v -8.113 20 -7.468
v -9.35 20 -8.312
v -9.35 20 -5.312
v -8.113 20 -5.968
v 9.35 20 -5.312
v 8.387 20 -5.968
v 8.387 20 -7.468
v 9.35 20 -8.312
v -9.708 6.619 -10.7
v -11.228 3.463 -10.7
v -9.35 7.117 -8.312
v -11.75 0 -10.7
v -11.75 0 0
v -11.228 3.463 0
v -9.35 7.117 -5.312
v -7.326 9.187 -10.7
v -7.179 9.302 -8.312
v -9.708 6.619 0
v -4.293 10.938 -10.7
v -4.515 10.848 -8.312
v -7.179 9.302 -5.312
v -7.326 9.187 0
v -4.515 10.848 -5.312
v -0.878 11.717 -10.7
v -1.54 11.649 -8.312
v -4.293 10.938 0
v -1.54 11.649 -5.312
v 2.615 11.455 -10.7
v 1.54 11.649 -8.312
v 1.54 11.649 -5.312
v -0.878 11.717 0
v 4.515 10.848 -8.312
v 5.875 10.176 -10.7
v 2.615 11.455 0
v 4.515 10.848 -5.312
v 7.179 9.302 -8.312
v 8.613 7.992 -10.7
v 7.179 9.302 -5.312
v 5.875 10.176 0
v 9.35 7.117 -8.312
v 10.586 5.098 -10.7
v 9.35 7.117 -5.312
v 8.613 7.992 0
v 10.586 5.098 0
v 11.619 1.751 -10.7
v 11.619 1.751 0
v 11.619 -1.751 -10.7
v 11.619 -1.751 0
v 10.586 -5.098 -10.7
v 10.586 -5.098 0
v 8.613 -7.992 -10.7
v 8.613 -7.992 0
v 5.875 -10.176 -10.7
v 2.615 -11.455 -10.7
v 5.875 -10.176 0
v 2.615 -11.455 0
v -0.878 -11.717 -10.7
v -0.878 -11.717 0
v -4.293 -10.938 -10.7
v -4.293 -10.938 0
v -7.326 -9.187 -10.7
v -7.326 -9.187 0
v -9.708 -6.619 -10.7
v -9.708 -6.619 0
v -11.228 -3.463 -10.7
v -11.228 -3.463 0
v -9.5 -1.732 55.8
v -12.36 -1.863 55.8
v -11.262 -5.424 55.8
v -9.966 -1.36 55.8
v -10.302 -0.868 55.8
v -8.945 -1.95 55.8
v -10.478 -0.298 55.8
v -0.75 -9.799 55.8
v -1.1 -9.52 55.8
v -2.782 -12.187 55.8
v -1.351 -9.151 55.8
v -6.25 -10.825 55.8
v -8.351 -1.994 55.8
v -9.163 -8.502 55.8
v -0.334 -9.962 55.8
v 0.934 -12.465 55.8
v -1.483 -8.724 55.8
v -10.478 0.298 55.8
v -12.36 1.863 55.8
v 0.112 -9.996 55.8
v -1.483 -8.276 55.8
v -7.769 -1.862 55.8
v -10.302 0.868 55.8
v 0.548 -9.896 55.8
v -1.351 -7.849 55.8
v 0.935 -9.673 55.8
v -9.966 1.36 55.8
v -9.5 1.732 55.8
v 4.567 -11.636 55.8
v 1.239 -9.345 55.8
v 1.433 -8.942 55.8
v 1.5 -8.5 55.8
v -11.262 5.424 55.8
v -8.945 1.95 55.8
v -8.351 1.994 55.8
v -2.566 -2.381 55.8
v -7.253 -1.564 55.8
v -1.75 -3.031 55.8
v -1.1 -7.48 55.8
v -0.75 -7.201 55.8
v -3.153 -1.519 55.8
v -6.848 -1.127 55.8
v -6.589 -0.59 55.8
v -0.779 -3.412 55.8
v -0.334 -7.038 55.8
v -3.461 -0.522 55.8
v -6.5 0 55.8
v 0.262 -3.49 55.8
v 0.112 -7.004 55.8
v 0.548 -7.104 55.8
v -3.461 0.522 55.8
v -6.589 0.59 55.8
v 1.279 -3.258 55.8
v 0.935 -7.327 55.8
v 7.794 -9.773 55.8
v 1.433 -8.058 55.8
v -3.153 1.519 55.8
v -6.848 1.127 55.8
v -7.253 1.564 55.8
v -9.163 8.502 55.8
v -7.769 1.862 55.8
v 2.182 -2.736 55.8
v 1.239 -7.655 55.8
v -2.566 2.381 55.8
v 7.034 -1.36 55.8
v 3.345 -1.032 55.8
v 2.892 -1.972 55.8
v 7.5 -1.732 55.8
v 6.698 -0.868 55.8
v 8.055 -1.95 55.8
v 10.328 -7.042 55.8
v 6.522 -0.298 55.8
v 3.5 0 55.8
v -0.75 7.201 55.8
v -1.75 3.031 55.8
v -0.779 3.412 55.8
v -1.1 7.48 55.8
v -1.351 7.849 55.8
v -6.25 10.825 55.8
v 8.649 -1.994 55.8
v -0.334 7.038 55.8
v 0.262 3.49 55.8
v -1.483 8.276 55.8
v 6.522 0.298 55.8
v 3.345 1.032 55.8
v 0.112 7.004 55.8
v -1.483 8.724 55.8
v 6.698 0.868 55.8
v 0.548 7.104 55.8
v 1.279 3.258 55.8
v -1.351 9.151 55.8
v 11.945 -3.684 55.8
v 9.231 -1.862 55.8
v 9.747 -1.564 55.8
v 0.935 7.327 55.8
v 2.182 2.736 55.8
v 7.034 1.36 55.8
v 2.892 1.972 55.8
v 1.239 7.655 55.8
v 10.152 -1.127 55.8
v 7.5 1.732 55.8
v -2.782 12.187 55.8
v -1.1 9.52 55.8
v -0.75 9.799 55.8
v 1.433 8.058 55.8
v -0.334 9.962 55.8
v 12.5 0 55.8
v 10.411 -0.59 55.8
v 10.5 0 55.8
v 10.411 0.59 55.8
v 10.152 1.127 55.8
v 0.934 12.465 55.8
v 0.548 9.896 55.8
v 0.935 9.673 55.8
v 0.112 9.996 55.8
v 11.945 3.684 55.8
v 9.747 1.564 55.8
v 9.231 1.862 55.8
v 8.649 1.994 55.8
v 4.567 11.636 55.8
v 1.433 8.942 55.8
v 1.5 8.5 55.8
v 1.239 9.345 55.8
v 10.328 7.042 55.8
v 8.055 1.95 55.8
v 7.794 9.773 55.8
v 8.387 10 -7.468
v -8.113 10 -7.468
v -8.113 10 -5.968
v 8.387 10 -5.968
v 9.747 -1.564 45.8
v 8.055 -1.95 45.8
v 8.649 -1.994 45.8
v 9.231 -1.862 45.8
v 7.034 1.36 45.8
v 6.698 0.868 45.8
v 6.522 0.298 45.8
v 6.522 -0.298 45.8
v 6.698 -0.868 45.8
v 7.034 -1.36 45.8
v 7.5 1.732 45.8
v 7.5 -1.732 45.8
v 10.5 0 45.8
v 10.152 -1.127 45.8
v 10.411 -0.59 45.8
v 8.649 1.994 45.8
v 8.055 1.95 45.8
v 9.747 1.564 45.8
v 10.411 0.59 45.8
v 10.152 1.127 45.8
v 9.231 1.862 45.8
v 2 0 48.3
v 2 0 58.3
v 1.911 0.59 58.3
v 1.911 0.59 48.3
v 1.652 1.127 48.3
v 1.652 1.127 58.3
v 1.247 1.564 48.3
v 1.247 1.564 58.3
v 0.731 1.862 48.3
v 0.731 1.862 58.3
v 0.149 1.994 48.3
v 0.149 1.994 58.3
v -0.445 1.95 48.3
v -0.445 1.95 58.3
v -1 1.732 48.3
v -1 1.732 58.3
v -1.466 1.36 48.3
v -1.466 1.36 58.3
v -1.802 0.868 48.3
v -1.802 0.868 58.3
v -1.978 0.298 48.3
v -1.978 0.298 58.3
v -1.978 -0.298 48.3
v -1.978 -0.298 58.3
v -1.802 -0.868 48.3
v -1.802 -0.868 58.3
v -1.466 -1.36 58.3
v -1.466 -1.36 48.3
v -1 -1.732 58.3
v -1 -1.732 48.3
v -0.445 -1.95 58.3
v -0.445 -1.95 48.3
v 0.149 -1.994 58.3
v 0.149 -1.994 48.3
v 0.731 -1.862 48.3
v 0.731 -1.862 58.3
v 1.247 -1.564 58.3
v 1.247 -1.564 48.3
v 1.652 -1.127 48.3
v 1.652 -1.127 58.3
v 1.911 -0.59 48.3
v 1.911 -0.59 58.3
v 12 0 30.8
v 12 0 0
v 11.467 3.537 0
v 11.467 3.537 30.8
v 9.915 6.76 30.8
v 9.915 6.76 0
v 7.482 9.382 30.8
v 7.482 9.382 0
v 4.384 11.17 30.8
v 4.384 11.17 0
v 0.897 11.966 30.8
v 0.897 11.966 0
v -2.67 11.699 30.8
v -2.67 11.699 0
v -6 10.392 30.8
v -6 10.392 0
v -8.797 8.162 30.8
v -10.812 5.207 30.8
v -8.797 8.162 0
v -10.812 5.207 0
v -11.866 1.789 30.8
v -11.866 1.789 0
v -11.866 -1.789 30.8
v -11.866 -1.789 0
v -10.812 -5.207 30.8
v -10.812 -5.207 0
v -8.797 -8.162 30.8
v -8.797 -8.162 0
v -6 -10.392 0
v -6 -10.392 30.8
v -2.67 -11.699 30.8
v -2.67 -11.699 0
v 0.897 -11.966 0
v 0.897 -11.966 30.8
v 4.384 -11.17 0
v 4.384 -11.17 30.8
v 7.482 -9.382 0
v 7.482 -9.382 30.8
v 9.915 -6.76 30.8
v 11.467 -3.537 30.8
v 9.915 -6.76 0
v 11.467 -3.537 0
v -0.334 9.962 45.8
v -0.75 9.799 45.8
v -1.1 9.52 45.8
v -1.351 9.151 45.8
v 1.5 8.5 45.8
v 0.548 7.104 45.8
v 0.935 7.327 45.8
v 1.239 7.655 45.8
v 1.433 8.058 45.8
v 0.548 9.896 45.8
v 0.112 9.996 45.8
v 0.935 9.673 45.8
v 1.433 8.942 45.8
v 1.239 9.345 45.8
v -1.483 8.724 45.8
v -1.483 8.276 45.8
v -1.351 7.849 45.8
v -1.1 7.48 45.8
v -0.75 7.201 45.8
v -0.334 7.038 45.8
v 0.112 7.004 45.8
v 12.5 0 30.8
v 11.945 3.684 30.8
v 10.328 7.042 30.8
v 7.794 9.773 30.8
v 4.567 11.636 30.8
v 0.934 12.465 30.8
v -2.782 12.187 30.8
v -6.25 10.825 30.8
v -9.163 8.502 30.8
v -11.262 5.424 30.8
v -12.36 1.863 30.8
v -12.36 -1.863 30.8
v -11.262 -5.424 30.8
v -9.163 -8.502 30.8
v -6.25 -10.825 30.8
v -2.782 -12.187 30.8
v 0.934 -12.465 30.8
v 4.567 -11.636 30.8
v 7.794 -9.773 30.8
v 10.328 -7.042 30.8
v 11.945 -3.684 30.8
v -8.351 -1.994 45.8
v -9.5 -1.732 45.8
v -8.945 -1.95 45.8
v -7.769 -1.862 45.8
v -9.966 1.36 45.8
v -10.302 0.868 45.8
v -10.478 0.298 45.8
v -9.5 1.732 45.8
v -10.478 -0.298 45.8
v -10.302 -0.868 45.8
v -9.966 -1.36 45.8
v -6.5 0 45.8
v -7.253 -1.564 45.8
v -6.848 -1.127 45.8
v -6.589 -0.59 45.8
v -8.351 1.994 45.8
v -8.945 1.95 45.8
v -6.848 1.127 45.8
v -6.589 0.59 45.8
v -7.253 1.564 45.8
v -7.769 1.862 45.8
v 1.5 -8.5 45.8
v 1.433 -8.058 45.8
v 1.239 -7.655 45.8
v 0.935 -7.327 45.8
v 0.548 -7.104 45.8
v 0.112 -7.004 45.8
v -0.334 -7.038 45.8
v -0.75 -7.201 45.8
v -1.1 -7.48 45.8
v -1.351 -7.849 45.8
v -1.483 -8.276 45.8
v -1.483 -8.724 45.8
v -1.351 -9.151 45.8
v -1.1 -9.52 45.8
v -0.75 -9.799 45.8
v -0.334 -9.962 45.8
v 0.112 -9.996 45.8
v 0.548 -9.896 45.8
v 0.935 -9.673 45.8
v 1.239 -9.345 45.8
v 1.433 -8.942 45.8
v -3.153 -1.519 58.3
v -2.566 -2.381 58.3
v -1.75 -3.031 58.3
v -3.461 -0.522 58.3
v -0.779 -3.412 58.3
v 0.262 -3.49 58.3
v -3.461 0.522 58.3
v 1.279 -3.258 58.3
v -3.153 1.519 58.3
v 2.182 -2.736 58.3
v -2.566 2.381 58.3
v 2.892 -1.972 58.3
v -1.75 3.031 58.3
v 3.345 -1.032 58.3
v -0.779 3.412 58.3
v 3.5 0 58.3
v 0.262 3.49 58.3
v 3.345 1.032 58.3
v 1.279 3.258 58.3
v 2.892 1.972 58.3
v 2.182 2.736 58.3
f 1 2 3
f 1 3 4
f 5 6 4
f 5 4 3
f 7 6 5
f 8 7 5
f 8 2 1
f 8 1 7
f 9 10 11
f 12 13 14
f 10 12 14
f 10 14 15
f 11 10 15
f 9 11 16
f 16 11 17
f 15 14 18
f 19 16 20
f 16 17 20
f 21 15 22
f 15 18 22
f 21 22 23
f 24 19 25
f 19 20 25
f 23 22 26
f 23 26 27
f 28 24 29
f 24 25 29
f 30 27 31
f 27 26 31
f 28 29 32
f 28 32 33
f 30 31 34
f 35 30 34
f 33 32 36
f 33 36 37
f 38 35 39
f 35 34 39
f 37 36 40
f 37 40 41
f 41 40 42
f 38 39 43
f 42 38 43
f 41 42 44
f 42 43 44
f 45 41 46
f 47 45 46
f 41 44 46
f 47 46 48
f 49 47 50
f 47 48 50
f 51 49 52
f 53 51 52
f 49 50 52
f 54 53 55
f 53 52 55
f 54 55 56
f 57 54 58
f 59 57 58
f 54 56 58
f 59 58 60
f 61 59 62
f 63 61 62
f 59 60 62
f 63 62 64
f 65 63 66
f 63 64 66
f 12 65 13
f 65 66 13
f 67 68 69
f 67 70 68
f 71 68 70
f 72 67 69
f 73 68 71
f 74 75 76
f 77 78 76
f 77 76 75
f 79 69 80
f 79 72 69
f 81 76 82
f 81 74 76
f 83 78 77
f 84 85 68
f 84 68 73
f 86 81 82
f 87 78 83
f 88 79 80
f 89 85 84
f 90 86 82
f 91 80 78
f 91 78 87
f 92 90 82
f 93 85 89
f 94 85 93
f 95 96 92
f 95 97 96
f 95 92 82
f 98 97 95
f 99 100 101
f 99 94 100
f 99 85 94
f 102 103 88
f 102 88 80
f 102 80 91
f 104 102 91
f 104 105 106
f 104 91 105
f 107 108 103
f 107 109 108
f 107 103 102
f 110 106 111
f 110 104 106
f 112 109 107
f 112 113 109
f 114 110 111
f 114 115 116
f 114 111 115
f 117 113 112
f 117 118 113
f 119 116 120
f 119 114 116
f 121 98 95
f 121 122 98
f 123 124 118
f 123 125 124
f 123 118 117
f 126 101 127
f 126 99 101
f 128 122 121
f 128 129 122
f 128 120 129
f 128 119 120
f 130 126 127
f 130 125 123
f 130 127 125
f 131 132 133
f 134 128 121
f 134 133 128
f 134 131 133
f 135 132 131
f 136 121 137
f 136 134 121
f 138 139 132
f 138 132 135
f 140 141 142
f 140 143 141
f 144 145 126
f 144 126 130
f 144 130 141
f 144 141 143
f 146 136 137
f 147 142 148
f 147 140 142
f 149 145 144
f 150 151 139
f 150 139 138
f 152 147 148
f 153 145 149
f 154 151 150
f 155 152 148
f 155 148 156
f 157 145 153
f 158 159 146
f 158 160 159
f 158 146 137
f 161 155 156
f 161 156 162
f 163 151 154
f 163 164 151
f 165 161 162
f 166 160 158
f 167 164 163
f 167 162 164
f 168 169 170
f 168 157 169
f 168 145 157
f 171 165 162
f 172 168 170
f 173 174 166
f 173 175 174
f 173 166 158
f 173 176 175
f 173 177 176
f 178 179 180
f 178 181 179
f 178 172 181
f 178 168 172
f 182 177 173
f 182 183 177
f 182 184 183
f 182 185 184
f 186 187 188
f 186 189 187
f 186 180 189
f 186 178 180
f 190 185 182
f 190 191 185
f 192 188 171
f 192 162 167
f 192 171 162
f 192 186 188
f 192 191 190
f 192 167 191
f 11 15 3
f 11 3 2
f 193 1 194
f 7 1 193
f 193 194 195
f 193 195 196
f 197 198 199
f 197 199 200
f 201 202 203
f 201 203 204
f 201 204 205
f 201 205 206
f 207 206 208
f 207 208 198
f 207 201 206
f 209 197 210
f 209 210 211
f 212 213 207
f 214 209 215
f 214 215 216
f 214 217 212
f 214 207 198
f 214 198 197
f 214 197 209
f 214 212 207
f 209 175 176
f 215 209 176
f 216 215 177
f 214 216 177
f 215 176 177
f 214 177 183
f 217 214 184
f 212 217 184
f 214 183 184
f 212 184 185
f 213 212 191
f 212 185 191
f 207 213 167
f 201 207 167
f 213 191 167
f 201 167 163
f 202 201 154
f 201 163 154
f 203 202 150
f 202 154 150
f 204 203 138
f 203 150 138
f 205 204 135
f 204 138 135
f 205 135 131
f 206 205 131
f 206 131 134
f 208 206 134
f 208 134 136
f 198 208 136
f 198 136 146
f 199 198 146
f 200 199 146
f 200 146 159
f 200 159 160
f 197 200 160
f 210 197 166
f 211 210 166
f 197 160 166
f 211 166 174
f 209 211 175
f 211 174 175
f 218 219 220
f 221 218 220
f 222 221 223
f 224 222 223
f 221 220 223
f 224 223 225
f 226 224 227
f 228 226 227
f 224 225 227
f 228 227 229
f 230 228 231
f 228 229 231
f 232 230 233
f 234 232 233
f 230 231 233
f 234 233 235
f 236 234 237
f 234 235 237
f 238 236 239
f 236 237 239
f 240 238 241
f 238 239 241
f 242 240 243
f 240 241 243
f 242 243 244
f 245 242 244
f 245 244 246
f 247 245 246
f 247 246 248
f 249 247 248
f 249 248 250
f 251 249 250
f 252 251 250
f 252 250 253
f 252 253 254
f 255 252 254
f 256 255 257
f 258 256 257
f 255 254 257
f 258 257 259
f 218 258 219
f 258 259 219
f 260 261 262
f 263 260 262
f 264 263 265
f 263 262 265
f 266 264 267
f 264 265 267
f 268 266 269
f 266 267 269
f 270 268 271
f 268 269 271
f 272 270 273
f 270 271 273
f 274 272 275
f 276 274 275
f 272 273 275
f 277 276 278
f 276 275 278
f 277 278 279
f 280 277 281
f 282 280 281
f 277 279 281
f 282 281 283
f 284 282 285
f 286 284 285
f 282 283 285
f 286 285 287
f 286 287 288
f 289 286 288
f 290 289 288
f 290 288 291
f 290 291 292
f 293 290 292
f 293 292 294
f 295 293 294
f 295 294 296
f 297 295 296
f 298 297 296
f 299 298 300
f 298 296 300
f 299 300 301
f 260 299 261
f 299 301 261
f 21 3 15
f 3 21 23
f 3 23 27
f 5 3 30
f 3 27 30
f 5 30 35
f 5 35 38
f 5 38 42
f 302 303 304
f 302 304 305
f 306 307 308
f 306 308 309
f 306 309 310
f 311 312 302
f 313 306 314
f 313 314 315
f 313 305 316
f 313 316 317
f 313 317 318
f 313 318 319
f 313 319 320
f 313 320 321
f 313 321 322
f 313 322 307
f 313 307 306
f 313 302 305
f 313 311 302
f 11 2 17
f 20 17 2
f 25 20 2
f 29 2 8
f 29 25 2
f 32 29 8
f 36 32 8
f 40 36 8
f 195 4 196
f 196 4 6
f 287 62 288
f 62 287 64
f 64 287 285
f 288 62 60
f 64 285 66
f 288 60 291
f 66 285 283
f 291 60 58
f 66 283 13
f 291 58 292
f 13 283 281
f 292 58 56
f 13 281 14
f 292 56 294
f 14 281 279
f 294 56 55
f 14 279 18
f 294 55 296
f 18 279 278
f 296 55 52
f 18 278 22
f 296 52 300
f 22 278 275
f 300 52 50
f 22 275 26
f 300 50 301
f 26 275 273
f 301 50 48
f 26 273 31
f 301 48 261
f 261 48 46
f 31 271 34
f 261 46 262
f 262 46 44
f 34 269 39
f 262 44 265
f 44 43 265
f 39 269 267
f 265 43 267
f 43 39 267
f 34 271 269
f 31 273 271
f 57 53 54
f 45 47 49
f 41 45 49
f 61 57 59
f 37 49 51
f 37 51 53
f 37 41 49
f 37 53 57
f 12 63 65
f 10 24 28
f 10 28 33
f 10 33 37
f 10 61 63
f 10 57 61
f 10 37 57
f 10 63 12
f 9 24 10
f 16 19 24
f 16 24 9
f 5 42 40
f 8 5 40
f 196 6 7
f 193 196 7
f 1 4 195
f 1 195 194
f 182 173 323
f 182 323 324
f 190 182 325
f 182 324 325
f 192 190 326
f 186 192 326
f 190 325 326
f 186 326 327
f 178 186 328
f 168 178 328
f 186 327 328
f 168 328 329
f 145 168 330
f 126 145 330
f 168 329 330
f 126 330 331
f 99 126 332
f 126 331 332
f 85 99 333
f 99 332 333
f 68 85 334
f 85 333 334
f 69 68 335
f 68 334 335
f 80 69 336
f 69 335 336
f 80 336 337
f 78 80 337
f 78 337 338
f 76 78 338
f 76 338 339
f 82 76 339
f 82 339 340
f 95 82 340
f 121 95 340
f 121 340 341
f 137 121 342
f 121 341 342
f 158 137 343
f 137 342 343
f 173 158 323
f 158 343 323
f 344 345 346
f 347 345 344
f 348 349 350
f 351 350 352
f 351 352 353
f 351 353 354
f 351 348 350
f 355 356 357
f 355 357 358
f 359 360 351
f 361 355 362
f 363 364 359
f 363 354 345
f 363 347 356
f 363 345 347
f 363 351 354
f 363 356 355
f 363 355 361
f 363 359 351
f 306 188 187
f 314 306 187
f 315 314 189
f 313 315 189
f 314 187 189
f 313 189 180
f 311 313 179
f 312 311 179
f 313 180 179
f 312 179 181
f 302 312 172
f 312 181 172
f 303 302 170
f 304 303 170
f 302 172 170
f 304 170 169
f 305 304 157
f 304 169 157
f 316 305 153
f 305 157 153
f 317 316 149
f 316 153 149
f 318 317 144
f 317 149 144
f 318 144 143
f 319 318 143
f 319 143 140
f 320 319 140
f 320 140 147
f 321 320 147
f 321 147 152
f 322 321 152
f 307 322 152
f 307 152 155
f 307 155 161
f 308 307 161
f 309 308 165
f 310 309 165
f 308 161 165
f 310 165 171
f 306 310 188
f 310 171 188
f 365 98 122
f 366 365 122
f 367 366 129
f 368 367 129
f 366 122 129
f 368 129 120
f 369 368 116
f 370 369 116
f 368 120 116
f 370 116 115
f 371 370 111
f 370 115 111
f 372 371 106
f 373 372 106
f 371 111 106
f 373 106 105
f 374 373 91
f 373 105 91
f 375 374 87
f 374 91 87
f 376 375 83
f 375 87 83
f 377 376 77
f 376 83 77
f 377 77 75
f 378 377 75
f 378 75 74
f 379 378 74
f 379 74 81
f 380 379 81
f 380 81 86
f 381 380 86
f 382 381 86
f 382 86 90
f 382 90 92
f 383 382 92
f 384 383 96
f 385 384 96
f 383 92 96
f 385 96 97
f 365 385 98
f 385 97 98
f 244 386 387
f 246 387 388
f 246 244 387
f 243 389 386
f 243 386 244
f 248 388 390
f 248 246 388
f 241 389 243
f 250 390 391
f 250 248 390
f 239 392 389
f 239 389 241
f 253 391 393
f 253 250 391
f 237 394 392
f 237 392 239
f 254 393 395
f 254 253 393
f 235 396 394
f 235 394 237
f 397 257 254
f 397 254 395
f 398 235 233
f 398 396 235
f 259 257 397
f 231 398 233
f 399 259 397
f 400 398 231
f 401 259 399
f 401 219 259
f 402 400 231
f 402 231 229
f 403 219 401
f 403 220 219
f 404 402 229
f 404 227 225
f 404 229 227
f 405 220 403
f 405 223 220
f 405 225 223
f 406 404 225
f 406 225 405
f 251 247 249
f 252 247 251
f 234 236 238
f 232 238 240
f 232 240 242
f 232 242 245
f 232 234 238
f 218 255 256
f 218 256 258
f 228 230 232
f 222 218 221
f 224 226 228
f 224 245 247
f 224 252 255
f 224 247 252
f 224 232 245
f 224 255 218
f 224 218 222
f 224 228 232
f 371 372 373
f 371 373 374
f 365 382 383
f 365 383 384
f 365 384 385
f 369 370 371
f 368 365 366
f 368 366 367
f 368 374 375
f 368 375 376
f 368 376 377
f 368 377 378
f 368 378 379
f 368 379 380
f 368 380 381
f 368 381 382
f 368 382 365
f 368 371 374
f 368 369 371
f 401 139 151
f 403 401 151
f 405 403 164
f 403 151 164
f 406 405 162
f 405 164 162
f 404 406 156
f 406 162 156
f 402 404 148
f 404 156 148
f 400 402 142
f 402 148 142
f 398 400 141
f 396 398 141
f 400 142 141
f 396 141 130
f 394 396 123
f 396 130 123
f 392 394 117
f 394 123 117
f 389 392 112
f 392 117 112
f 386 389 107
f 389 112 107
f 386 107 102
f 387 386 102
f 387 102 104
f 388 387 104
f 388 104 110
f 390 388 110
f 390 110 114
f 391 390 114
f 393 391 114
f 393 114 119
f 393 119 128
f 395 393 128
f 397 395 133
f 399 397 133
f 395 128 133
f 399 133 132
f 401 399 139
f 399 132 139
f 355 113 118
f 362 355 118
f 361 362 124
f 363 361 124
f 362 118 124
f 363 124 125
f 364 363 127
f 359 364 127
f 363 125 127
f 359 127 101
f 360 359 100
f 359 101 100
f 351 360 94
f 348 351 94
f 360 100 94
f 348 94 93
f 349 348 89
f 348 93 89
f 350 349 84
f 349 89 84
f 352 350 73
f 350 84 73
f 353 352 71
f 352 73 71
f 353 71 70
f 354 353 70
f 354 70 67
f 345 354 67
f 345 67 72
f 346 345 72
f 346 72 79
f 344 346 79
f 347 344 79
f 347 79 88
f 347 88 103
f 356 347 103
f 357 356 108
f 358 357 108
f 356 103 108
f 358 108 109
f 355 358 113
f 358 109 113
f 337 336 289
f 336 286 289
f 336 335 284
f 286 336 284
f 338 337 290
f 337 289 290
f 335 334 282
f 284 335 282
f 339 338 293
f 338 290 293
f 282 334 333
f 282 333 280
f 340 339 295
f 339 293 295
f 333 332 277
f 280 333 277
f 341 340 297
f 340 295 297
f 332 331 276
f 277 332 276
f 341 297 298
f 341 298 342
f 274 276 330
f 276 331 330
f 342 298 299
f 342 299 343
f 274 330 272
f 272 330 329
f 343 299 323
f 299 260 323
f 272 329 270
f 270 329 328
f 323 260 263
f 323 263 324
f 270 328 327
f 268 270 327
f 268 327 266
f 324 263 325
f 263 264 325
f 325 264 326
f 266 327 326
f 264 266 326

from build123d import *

# Parameters (mm, degrees)
SKETCH1_R           = 12
BOSS_EXTRUDE1_DEPTH = 30.8
SKETCH2_R           = 12.5
BOSS_EXTRUDE2_DEPTH = 25
SKETCH3_R           = 3.5
BOSS_EXTRUDE3_DEPTH = 2.5
SKETCH6_R           = 11.75
BOSS_EXTRUDE5_DEPTH = 10.7
SKETCH7_W           = 18.699432978
SKETCH7_H           = 3
BOSS_EXTRUDE6_DEPTH = 20
SKETCH10_W          = 16.5
SKETCH10_H          = 1.5
CUT_EXTRUDE4_DEPTH  = 10
SKETCH4_R           = 2
CUT_EXTRUDE7_DEPTH  = 10
SKETCH11_R          = 1.5
SKETCH11_R_2        = 2
CUT_EXTRUDE8_DEPTH  = 10


with BuildPart() as part:
    # Sketch1 → Boss-Extrude1 (new body)
    with BuildSketch(Plane.XY):
        Circle(SKETCH1_R)
    extrude(amount=BOSS_EXTRUDE1_DEPTH)

    # Sketch2 → Boss-Extrude2 (add)
    with BuildSketch(Plane.XY.offset(30.8)):
        Circle(SKETCH2_R)
    extrude(amount=BOSS_EXTRUDE2_DEPTH)

    # Sketch3 → Boss-Extrude3 (add)
    with BuildSketch(Plane.XY.offset(55.8)):
        Circle(SKETCH3_R)
    extrude(amount=BOSS_EXTRUDE3_DEPTH)

    # Sketch6 → Boss-Extrude5 (add)
    with BuildSketch(Plane(origin=(0, 0, 0), x_dir=(-1, 0, 0), z_dir=(0, 0, -1))):
        Circle(SKETCH6_R)
    extrude(amount=BOSS_EXTRUDE5_DEPTH)

    # Sketch7 → Boss-Extrude6 (add)
    with BuildSketch(Plane(origin=(0, 0, 0), x_dir=(1, 0, 0), z_dir=(0, 1, 0))):
        with Locations((0, 6.81237414)):
            Rectangle(SKETCH7_W, SKETCH7_H)
    extrude(amount=BOSS_EXTRUDE6_DEPTH)

    # Sketch10 → Cut-Extrude4 (cut)
    with BuildSketch(Plane(origin=(0, 20, 0), x_dir=(1, 0, 0), z_dir=(0, 1, 0))):
        with Locations((0.137296408, 6.718389465)):
            Rectangle(SKETCH10_W, SKETCH10_H)
    extrude(amount=-CUT_EXTRUDE4_DEPTH, mode=Mode.SUBTRACT)

    # Sketch4 → Cut-Extrude7 (cut)
    with BuildSketch(Plane.XY.offset(58.3)):
        Circle(SKETCH4_R)
    extrude(amount=-CUT_EXTRUDE7_DEPTH, mode=Mode.SUBTRACT)

    # Sketch11 → Cut-Extrude8 (cut)
    with BuildSketch(Plane.XY.offset(55.8)):
        with Locations((0, 8.5)):
            Circle(SKETCH11_R)
        with Locations((8.5, 0)):
            Circle(SKETCH11_R_2)
        with Locations((-8.5, 0)):
            Circle(SKETCH11_R_2)
        with Locations((0, -8.5)):
            Circle(SKETCH11_R)
    extrude(amount=-CUT_EXTRUDE8_DEPTH, mode=Mode.SUBTRACT)


solid = part.part
